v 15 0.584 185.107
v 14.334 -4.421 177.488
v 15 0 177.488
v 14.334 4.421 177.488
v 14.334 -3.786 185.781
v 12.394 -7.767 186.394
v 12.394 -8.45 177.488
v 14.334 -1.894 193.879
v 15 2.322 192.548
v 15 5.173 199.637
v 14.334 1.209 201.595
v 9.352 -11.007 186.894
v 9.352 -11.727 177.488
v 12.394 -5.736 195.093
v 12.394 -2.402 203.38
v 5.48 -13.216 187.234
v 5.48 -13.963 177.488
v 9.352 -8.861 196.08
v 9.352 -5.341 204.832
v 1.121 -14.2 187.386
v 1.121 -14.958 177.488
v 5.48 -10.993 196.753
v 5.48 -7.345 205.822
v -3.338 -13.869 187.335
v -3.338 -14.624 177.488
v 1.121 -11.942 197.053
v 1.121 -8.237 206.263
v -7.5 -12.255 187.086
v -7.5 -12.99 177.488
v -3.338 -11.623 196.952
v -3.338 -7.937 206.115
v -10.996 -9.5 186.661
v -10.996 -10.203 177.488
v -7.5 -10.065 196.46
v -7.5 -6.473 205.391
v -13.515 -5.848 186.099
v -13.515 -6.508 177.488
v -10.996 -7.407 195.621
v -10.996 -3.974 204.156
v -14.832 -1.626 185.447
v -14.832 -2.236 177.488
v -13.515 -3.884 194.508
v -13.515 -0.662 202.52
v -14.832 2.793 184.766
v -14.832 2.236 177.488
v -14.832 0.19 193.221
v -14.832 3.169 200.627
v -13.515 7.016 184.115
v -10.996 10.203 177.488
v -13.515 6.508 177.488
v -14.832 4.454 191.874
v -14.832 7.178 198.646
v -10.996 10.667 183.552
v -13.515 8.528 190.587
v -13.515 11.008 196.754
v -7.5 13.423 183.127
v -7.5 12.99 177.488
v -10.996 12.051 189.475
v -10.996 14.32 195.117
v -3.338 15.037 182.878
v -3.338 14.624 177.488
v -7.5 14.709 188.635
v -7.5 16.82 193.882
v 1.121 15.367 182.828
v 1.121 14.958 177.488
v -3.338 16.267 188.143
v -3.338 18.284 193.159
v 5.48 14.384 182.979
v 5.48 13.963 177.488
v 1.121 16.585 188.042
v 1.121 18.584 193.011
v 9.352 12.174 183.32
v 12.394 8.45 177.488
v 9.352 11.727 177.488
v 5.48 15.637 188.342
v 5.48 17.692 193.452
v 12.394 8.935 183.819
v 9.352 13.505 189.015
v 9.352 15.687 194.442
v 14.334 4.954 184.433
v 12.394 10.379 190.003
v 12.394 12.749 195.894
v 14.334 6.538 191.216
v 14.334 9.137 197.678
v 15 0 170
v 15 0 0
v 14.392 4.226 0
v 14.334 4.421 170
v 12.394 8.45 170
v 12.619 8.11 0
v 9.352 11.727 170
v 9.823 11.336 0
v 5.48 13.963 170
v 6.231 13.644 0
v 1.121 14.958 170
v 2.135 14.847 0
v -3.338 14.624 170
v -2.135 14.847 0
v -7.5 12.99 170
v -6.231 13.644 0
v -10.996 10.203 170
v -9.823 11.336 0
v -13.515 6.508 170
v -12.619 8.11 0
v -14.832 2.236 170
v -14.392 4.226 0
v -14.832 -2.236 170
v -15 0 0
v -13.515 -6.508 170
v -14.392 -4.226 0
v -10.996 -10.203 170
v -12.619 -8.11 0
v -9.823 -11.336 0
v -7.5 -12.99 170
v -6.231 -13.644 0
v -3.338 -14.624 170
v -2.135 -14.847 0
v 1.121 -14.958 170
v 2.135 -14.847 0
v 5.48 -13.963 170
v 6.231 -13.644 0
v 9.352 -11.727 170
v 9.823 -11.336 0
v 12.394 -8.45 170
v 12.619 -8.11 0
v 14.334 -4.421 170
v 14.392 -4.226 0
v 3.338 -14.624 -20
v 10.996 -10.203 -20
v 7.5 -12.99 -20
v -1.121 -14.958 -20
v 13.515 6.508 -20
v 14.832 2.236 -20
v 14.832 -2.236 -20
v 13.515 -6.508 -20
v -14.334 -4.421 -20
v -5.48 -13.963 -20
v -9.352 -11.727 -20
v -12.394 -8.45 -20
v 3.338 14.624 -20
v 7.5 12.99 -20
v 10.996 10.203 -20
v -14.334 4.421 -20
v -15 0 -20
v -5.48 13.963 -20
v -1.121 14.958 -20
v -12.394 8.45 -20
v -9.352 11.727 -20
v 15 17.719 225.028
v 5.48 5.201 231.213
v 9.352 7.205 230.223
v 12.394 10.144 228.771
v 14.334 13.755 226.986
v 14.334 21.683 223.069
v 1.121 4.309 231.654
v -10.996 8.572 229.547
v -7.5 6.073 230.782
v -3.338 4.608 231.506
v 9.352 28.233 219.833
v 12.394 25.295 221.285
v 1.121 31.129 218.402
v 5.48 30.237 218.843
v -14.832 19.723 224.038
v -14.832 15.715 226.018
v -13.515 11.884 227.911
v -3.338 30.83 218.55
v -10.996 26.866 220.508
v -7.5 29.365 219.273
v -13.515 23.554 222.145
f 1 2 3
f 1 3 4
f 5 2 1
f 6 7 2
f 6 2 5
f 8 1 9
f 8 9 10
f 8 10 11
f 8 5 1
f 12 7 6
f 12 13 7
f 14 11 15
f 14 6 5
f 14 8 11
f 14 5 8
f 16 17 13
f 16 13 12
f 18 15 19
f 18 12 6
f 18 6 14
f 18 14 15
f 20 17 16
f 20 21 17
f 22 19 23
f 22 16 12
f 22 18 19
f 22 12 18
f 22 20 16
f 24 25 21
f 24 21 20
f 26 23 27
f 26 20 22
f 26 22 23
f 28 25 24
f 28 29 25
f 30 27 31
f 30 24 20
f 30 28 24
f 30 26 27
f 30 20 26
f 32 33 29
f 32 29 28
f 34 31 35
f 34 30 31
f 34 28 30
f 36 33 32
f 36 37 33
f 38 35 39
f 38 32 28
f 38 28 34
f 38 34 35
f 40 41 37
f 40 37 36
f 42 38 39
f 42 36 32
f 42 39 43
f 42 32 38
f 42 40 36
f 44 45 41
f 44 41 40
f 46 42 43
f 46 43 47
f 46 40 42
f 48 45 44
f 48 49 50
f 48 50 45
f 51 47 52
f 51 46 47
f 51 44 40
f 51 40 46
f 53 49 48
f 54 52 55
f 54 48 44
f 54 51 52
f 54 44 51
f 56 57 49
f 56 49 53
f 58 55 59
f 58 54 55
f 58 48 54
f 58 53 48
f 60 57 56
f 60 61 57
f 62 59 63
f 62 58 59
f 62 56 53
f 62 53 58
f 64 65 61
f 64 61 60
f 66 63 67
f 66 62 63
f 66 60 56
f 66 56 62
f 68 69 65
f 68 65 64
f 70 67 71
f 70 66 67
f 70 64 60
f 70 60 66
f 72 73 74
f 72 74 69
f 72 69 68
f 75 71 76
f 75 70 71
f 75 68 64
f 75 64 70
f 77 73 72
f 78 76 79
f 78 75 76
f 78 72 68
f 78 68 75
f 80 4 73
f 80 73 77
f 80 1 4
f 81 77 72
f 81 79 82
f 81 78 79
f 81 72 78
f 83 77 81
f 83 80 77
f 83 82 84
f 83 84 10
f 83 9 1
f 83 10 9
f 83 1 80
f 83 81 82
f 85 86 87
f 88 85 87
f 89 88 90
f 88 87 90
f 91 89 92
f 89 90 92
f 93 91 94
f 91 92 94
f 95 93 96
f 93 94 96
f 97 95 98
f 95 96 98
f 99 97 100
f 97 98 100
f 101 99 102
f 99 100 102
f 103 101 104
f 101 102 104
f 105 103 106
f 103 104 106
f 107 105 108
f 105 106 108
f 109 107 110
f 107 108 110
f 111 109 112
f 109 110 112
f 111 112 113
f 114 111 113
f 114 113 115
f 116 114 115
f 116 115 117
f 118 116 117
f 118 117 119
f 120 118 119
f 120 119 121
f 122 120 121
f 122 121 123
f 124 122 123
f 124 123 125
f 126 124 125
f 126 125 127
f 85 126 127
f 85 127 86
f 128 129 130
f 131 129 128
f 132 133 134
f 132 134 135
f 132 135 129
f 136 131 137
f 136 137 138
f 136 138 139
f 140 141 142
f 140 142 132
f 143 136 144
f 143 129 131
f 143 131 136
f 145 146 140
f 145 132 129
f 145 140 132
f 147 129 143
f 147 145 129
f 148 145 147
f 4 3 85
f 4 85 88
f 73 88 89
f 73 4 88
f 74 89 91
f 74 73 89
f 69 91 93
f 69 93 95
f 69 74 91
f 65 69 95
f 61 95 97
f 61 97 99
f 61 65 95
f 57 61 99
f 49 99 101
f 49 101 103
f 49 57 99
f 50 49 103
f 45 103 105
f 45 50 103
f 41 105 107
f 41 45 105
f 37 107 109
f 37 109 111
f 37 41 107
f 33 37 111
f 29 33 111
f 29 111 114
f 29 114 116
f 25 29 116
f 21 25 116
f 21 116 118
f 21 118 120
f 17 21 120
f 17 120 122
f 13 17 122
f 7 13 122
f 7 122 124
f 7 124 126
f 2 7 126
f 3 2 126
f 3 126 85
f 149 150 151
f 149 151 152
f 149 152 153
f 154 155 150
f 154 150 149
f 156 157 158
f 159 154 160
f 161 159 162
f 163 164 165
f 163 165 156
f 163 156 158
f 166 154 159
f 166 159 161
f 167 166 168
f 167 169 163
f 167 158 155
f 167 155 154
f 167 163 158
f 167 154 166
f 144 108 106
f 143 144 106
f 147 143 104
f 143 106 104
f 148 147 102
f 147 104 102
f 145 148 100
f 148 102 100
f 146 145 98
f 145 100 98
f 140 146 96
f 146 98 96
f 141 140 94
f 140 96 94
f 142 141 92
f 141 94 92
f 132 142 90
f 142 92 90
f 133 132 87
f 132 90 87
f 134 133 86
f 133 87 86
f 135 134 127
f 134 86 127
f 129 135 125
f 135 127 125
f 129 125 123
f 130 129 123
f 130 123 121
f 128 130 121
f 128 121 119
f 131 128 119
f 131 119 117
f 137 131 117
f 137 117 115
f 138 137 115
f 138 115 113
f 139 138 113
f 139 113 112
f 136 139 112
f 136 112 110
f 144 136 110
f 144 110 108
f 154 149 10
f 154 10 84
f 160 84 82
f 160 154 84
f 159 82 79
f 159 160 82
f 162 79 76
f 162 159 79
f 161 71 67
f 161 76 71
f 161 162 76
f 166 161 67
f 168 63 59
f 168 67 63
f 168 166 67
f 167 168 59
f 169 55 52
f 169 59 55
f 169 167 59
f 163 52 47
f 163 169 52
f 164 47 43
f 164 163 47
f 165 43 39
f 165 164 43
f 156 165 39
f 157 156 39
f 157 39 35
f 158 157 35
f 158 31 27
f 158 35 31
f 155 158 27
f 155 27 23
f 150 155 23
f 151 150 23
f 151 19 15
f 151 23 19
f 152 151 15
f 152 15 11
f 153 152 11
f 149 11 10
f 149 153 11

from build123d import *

# Parameters (mm, degrees)
CROQUIS1_R              = 15
SALIENTE_EXTRUIR1_DEPTH = 170
CROQUIS2_R              = 15
CROQUIS3_R              = 15
SALIENTE_EXTRUIR2_DEPTH = 20


with BuildPart() as part:
    # Croquis1 → Saliente-Extruir1 (new body)
    with BuildSketch(Plane.XY):
        Circle(CROQUIS1_R)
    extrude(amount=SALIENTE_EXTRUIR1_DEPTH)

    # Barrer1: sweep along a curve in space
    with BuildLine() as barrer1_path:
        Line((0, 0, 170), (0, 0, 177.4880174))
        ThreePointArc((0, 0, 177.4880174), (0, 1.310507191, 188.860496902), (0, 5.173331601, 199.636827757))
        Line((0, 5.173331601, 199.636827757), (0, 17.719048286, 225.027928795))
    # Croquis2 → Barrer1 (sweep)
    with BuildSketch(Plane.XY.offset(170)):
        Circle(CROQUIS2_R)
    sweep(path=barrer1_path.line)

    # Croquis3 → Saliente-Extruir2 (add)
    with BuildSketch(Plane(origin=(0, 0, 0), x_dir=(-1, 0, 0), z_dir=(0, 0, -1))):
        Circle(CROQUIS3_R)
    extrude(amount=SALIENTE_EXTRUIR2_DEPTH)


solid = part.part
